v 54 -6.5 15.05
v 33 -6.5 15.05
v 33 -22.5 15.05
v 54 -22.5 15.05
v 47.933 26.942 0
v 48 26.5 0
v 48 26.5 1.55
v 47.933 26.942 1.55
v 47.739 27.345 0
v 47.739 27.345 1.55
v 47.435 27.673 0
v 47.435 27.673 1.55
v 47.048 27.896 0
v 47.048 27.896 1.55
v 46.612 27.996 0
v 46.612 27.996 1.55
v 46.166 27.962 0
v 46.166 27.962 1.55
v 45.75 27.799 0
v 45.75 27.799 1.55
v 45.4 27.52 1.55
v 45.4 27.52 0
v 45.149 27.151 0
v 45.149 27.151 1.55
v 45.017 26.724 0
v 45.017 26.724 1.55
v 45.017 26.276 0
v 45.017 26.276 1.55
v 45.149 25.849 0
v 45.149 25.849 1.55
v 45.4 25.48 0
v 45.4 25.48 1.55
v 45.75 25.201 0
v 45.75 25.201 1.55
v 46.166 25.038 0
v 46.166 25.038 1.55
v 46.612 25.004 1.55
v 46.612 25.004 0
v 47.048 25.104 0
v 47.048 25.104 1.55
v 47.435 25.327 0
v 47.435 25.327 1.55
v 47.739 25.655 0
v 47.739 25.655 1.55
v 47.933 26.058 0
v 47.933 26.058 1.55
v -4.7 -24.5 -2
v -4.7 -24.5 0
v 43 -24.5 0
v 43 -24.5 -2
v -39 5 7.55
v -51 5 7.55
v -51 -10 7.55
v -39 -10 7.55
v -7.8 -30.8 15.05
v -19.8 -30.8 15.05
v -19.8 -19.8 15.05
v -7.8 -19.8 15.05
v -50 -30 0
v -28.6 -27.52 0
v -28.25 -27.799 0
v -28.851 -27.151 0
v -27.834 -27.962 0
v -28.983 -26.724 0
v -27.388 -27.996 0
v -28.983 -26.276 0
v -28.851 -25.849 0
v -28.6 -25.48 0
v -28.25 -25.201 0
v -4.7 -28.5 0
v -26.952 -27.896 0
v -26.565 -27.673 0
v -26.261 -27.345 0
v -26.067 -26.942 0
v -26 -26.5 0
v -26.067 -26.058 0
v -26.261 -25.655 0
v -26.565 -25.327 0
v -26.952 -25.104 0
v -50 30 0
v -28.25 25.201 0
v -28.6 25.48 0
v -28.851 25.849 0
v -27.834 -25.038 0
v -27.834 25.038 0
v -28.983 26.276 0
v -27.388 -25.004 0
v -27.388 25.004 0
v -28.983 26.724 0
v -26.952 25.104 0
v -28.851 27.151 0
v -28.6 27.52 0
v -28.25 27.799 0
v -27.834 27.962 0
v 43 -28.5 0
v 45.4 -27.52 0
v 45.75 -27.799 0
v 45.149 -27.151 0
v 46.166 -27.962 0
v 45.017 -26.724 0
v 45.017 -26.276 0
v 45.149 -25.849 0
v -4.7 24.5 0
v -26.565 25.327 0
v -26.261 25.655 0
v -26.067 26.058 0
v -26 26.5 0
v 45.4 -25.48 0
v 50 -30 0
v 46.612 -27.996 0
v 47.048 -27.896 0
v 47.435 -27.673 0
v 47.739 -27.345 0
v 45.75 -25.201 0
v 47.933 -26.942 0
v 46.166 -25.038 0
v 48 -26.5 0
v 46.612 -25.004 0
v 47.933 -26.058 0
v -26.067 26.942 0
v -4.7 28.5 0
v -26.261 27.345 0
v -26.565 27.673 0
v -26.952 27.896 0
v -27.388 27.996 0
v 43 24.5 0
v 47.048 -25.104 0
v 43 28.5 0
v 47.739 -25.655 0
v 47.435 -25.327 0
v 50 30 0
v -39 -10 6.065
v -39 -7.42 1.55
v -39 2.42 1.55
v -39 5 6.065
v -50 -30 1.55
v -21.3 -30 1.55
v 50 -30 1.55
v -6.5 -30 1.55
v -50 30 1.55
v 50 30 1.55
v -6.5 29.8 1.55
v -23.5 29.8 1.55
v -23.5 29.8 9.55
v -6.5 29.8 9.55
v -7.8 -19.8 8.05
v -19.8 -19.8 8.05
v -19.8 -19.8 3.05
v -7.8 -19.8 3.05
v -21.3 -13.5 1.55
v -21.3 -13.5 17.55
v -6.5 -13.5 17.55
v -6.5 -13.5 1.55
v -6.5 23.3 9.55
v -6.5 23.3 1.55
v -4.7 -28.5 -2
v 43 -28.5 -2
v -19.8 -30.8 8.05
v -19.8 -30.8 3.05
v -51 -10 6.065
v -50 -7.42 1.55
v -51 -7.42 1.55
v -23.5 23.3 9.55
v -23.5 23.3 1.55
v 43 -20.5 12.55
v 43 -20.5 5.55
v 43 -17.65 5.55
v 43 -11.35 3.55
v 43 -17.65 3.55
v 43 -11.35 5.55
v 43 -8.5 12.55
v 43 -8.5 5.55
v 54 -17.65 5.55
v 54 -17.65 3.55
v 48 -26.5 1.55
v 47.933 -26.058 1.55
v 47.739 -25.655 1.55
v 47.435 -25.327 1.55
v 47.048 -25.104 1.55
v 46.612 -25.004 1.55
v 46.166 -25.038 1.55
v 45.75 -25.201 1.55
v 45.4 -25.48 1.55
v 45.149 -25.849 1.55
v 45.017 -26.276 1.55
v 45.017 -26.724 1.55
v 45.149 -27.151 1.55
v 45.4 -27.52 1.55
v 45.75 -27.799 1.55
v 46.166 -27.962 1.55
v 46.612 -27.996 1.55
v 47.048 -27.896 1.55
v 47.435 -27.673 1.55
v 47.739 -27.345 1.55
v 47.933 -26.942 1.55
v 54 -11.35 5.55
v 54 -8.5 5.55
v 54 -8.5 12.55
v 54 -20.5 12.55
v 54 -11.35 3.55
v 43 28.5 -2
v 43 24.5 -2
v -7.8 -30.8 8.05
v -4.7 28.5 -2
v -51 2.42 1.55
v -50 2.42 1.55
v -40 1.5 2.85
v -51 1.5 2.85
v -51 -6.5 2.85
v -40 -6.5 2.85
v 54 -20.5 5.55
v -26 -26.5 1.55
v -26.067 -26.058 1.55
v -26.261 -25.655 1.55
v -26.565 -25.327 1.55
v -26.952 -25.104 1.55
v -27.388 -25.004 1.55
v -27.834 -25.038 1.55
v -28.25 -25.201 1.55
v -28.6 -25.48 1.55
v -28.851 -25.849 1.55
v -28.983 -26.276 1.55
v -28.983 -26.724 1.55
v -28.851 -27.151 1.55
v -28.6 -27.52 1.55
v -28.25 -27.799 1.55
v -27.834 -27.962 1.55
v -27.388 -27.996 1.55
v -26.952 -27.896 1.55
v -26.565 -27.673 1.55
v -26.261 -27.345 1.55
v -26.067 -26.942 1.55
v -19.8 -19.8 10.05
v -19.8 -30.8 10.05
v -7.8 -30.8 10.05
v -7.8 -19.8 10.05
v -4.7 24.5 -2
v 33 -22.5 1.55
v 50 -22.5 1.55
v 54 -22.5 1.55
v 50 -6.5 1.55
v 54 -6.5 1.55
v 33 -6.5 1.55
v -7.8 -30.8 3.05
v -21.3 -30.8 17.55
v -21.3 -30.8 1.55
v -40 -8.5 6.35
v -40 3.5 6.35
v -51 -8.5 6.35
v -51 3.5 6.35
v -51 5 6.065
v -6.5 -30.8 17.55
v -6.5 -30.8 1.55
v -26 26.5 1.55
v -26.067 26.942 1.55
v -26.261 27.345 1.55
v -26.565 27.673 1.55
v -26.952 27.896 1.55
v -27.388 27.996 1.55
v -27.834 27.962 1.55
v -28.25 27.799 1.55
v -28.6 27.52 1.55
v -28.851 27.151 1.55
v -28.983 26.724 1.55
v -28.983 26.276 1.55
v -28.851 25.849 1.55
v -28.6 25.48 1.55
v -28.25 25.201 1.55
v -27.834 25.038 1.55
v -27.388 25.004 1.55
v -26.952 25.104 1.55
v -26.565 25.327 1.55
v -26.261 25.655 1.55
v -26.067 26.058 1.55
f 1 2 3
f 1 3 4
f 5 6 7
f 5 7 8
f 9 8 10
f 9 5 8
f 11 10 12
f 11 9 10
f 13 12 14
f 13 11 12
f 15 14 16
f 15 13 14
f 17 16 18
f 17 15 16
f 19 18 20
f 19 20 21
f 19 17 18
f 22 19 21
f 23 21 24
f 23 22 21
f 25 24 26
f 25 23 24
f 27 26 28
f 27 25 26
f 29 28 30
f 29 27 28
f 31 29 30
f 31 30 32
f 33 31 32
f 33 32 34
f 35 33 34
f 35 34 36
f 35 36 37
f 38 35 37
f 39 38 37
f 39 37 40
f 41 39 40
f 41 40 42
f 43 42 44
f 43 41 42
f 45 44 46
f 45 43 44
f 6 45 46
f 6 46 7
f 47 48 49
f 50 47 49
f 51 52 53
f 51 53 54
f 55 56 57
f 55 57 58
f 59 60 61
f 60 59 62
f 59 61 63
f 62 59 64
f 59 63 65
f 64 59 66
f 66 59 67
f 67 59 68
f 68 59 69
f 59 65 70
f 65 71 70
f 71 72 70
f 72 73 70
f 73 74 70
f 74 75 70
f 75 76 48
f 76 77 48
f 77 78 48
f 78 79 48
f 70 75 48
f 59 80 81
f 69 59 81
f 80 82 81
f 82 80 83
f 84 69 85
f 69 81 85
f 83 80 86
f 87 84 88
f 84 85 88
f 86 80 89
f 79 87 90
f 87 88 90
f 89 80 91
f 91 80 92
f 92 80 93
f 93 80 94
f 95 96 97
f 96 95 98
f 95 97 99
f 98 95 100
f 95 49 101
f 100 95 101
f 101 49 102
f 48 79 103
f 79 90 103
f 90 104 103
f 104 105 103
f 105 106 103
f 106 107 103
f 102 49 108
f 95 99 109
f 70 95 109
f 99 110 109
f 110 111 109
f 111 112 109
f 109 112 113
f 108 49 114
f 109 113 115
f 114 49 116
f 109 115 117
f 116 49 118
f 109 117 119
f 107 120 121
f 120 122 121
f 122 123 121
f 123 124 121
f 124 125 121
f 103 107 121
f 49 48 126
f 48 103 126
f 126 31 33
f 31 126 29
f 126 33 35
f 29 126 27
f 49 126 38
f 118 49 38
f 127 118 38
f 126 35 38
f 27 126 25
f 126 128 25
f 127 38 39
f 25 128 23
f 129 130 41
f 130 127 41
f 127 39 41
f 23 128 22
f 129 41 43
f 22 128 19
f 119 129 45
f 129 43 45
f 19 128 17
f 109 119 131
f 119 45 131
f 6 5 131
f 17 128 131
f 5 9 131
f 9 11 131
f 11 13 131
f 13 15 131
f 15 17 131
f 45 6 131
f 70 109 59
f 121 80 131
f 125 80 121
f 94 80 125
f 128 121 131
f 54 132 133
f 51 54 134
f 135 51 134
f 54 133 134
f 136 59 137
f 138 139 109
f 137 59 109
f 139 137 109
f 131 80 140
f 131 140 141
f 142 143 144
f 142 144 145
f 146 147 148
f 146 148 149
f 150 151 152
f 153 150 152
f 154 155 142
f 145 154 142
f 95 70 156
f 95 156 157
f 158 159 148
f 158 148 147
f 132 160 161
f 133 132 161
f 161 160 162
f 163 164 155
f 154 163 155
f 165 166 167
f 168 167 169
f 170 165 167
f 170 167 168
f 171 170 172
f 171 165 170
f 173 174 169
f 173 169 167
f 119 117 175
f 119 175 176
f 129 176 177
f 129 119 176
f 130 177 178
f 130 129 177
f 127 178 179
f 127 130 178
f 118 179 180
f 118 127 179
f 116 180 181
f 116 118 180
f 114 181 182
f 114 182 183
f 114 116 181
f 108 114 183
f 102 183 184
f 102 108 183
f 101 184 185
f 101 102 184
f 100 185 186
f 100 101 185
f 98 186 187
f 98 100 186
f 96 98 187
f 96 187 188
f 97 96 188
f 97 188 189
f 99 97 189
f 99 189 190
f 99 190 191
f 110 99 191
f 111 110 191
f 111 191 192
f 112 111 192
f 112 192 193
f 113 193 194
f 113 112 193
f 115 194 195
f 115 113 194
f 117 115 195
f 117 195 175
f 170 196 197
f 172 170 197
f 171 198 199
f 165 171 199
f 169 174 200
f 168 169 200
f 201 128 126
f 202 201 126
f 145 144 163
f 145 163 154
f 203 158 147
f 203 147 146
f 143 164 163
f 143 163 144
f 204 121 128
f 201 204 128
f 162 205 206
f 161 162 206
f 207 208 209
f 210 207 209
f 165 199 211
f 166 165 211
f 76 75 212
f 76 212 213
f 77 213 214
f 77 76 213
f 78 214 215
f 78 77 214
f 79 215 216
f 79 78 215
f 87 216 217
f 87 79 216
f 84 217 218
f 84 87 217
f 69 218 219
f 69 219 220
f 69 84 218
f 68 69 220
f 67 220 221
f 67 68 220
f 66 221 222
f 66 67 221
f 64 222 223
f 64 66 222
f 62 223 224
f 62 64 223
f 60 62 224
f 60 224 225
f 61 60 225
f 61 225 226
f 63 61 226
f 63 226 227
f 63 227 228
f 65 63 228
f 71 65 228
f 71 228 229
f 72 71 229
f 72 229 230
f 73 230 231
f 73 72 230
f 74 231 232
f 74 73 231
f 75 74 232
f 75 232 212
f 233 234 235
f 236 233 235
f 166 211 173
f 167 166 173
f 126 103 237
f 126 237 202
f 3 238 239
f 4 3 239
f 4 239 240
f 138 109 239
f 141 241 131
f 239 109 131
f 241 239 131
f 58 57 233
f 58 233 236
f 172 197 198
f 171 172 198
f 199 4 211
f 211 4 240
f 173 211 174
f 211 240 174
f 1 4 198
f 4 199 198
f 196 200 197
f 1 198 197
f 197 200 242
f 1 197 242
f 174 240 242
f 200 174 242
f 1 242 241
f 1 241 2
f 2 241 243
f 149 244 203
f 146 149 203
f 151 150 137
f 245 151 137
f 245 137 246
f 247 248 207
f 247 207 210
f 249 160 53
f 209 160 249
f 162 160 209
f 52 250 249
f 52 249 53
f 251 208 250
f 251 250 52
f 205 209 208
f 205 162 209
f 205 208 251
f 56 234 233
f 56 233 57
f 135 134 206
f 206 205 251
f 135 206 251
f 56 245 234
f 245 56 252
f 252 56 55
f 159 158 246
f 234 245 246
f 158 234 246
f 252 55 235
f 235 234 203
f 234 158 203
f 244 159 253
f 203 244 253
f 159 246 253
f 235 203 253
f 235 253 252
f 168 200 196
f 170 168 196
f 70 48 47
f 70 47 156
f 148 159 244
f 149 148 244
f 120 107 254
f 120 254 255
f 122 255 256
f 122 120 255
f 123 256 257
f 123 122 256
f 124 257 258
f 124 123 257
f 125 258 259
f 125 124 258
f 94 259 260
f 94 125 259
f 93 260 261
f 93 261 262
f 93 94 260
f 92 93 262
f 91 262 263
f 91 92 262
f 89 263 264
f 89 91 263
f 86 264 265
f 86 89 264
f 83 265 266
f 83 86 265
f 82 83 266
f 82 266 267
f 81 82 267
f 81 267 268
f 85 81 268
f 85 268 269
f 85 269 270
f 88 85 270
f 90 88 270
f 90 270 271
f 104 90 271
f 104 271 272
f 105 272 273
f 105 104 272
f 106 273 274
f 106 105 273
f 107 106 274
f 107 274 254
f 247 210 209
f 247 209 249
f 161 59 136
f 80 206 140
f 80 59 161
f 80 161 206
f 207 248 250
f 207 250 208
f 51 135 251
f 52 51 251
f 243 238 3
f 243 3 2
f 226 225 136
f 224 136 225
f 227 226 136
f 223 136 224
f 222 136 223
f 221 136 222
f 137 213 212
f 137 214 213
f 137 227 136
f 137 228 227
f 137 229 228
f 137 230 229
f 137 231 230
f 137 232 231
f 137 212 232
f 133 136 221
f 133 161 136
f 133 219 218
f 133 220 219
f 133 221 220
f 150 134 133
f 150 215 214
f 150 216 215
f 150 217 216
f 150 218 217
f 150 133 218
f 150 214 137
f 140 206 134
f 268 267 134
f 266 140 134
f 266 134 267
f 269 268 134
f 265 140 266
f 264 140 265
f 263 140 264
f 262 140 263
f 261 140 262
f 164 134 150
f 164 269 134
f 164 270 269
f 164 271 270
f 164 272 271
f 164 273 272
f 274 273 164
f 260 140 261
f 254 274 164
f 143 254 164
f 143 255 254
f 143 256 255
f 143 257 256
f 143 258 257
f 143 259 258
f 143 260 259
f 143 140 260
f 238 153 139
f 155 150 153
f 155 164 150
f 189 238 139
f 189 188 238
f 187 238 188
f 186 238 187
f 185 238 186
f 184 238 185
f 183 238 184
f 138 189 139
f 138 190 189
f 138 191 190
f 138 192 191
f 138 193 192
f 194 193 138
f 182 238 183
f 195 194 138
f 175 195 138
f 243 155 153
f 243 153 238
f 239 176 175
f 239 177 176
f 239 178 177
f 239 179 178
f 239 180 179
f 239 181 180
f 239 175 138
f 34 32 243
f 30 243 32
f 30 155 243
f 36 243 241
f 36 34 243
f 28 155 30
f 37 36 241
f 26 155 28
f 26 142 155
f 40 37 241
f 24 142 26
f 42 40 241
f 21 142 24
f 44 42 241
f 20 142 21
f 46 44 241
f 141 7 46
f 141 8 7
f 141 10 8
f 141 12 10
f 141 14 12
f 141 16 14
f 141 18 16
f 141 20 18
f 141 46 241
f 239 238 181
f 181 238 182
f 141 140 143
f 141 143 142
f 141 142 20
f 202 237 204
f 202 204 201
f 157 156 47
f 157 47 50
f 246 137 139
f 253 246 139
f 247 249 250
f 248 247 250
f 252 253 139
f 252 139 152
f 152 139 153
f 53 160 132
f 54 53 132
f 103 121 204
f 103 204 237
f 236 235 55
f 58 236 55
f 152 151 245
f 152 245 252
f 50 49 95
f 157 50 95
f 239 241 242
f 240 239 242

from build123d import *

# Parameters (mm, degrees)
F0_W      = 100
F0_H      = 60
F0_R      = 1.5
F1_DEPTH  = 1.55
F2_W      = 17
F2_H      = 16
F2_W_2    = 4
F3_DEPTH  = 13.5
F4_W      = 14.8
F4_H      = 16.5
F4_H_2    = 0.8
F5_DEPTH  = 16
F6_W      = 47.7
F6_H      = 4
F7_DEPTH  = 2
F8_W      = 17
F8_H      = 6.5
F9_DEPTH  = 8
F10_W     = 11
F10_H     = 15
F10_W_2   = 1
F11_DEPTH = 6
F12_W     = 6.3
F12_H     = 2
F13_DEPTH = 11
F14_W     = 12
F14_H     = 5
F15_DEPTH = 11
F17_DEPTH = 11
F19_DEPTH = 12


with BuildPart() as f1:
    # F0 (on Top) → F1 (new body)
    with BuildSketch(Plane.XY):
        Rectangle(F0_W, F0_H)
        with Locations((-27.5, -26.5)):
            Circle(F0_R, mode=Mode.SUBTRACT)
        with Locations((46.5, -26.5)):
            Circle(F0_R, mode=Mode.SUBTRACT)
        with Locations((-27.5, 26.5)):
            Circle(F0_R, mode=Mode.SUBTRACT)
        with Locations((46.5, 26.5)):
            Circle(F0_R, mode=Mode.SUBTRACT)
    extrude(amount=F1_DEPTH)

    # F2 (on face) → F3 (join)
    with BuildSketch(Plane.XY.offset(1.55)):
        with Locations((41.5, -14.5)):
            Rectangle(F2_W, F2_H)
        with Locations((52, -14.5)):
            Rectangle(F2_W_2, F2_H)
    extrude(amount=F3_DEPTH)

    # F4 (on face) → F5 (join)
    with BuildSketch(Plane.XY.offset(1.55)):
        with Locations((-13.9, -21.75)):
            Rectangle(F4_W, F4_H)
        with Locations((-13.9, -30.4)):
            Rectangle(F4_W, F4_H_2)
    extrude(amount=F5_DEPTH)

    # F6 (on face) → F7 (join)
    with BuildSketch(Plane(origin=(0, 0, 0), x_dir=(1, 0, 0), z_dir=(0, 0, -1))):
        with Locations((19.15, 26.5)):
            Rectangle(F6_W, F6_H)
        with Locations((19.15, -26.5)):
            Rectangle(F6_W, F6_H)
    extrude(amount=F7_DEPTH)

    # F8 (on face) → F9 (join)
    with BuildSketch(Plane.XY.offset(1.55)):
        with Locations((-15, 26.55)):
            Rectangle(F8_W, F8_H)
    extrude(amount=F9_DEPTH)

    # F10 (on face) → F11 (join)
    with BuildSketch(Plane.XY.offset(1.55)):
        with Locations((-44.5, -2.5)):
            Rectangle(F10_W, F10_H)
        with Locations((-50.5, -2.5)):
            Rectangle(F10_W_2, F10_H)
    extrude(amount=F11_DEPTH)

    # F12 (on face) → F13 (cut)
    with BuildSketch(Plane.YZ.offset(54)):
        Polygon((-8.5, 12.55), (-20.5, 12.55), (-20.5, 5.55), (-17.6502, 5.55), (-11.3502, 5.55), (-8.5, 5.55), align=None)
        with Locations((-14.5002, 4.55)):
            Rectangle(F12_W, F12_H)
    extrude(amount=-F13_DEPTH, mode=Mode.SUBTRACT)

    # F14 (on face) → F15 (cut)
    with BuildSketch(Plane.XZ.offset(30.8)):
        with Locations((-13.8, 12.55)):
            Rectangle(F14_W, F14_H)
        with Locations((-13.8, 5.55)):
            Rectangle(F14_W, F14_H)
    extrude(amount=-F15_DEPTH, mode=Mode.SUBTRACT)

    # F16 (on face) → F17 (cut)
    with BuildSketch(Plane(origin=(-51, 0, 0), x_dir=(0, -1, 0), z_dir=(-1, 0, 0))):
        Polygon((8.5, 6.35), (-3.5, 6.35), (-1.5, 2.85), (6.5, 2.85), align=None)
    extrude(amount=-F17_DEPTH, mode=Mode.SUBTRACT)

    # F18 (on face) → F19 (cut, through all)
    with BuildSketch(Plane(origin=(-51, 0, 0), x_dir=(0, -1, 0), z_dir=(-1, 0, 0))):
        Polygon((10, 6.064864339), (7.4200775205, 1.55), (10, 1.55), align=None)
        Polygon((-5, 1.55), (-2.4200775205, 1.55), (-5, 6.064864339), align=None)
    extrude(amount=-F19_DEPTH, mode=Mode.SUBTRACT)


solid = f1.part
